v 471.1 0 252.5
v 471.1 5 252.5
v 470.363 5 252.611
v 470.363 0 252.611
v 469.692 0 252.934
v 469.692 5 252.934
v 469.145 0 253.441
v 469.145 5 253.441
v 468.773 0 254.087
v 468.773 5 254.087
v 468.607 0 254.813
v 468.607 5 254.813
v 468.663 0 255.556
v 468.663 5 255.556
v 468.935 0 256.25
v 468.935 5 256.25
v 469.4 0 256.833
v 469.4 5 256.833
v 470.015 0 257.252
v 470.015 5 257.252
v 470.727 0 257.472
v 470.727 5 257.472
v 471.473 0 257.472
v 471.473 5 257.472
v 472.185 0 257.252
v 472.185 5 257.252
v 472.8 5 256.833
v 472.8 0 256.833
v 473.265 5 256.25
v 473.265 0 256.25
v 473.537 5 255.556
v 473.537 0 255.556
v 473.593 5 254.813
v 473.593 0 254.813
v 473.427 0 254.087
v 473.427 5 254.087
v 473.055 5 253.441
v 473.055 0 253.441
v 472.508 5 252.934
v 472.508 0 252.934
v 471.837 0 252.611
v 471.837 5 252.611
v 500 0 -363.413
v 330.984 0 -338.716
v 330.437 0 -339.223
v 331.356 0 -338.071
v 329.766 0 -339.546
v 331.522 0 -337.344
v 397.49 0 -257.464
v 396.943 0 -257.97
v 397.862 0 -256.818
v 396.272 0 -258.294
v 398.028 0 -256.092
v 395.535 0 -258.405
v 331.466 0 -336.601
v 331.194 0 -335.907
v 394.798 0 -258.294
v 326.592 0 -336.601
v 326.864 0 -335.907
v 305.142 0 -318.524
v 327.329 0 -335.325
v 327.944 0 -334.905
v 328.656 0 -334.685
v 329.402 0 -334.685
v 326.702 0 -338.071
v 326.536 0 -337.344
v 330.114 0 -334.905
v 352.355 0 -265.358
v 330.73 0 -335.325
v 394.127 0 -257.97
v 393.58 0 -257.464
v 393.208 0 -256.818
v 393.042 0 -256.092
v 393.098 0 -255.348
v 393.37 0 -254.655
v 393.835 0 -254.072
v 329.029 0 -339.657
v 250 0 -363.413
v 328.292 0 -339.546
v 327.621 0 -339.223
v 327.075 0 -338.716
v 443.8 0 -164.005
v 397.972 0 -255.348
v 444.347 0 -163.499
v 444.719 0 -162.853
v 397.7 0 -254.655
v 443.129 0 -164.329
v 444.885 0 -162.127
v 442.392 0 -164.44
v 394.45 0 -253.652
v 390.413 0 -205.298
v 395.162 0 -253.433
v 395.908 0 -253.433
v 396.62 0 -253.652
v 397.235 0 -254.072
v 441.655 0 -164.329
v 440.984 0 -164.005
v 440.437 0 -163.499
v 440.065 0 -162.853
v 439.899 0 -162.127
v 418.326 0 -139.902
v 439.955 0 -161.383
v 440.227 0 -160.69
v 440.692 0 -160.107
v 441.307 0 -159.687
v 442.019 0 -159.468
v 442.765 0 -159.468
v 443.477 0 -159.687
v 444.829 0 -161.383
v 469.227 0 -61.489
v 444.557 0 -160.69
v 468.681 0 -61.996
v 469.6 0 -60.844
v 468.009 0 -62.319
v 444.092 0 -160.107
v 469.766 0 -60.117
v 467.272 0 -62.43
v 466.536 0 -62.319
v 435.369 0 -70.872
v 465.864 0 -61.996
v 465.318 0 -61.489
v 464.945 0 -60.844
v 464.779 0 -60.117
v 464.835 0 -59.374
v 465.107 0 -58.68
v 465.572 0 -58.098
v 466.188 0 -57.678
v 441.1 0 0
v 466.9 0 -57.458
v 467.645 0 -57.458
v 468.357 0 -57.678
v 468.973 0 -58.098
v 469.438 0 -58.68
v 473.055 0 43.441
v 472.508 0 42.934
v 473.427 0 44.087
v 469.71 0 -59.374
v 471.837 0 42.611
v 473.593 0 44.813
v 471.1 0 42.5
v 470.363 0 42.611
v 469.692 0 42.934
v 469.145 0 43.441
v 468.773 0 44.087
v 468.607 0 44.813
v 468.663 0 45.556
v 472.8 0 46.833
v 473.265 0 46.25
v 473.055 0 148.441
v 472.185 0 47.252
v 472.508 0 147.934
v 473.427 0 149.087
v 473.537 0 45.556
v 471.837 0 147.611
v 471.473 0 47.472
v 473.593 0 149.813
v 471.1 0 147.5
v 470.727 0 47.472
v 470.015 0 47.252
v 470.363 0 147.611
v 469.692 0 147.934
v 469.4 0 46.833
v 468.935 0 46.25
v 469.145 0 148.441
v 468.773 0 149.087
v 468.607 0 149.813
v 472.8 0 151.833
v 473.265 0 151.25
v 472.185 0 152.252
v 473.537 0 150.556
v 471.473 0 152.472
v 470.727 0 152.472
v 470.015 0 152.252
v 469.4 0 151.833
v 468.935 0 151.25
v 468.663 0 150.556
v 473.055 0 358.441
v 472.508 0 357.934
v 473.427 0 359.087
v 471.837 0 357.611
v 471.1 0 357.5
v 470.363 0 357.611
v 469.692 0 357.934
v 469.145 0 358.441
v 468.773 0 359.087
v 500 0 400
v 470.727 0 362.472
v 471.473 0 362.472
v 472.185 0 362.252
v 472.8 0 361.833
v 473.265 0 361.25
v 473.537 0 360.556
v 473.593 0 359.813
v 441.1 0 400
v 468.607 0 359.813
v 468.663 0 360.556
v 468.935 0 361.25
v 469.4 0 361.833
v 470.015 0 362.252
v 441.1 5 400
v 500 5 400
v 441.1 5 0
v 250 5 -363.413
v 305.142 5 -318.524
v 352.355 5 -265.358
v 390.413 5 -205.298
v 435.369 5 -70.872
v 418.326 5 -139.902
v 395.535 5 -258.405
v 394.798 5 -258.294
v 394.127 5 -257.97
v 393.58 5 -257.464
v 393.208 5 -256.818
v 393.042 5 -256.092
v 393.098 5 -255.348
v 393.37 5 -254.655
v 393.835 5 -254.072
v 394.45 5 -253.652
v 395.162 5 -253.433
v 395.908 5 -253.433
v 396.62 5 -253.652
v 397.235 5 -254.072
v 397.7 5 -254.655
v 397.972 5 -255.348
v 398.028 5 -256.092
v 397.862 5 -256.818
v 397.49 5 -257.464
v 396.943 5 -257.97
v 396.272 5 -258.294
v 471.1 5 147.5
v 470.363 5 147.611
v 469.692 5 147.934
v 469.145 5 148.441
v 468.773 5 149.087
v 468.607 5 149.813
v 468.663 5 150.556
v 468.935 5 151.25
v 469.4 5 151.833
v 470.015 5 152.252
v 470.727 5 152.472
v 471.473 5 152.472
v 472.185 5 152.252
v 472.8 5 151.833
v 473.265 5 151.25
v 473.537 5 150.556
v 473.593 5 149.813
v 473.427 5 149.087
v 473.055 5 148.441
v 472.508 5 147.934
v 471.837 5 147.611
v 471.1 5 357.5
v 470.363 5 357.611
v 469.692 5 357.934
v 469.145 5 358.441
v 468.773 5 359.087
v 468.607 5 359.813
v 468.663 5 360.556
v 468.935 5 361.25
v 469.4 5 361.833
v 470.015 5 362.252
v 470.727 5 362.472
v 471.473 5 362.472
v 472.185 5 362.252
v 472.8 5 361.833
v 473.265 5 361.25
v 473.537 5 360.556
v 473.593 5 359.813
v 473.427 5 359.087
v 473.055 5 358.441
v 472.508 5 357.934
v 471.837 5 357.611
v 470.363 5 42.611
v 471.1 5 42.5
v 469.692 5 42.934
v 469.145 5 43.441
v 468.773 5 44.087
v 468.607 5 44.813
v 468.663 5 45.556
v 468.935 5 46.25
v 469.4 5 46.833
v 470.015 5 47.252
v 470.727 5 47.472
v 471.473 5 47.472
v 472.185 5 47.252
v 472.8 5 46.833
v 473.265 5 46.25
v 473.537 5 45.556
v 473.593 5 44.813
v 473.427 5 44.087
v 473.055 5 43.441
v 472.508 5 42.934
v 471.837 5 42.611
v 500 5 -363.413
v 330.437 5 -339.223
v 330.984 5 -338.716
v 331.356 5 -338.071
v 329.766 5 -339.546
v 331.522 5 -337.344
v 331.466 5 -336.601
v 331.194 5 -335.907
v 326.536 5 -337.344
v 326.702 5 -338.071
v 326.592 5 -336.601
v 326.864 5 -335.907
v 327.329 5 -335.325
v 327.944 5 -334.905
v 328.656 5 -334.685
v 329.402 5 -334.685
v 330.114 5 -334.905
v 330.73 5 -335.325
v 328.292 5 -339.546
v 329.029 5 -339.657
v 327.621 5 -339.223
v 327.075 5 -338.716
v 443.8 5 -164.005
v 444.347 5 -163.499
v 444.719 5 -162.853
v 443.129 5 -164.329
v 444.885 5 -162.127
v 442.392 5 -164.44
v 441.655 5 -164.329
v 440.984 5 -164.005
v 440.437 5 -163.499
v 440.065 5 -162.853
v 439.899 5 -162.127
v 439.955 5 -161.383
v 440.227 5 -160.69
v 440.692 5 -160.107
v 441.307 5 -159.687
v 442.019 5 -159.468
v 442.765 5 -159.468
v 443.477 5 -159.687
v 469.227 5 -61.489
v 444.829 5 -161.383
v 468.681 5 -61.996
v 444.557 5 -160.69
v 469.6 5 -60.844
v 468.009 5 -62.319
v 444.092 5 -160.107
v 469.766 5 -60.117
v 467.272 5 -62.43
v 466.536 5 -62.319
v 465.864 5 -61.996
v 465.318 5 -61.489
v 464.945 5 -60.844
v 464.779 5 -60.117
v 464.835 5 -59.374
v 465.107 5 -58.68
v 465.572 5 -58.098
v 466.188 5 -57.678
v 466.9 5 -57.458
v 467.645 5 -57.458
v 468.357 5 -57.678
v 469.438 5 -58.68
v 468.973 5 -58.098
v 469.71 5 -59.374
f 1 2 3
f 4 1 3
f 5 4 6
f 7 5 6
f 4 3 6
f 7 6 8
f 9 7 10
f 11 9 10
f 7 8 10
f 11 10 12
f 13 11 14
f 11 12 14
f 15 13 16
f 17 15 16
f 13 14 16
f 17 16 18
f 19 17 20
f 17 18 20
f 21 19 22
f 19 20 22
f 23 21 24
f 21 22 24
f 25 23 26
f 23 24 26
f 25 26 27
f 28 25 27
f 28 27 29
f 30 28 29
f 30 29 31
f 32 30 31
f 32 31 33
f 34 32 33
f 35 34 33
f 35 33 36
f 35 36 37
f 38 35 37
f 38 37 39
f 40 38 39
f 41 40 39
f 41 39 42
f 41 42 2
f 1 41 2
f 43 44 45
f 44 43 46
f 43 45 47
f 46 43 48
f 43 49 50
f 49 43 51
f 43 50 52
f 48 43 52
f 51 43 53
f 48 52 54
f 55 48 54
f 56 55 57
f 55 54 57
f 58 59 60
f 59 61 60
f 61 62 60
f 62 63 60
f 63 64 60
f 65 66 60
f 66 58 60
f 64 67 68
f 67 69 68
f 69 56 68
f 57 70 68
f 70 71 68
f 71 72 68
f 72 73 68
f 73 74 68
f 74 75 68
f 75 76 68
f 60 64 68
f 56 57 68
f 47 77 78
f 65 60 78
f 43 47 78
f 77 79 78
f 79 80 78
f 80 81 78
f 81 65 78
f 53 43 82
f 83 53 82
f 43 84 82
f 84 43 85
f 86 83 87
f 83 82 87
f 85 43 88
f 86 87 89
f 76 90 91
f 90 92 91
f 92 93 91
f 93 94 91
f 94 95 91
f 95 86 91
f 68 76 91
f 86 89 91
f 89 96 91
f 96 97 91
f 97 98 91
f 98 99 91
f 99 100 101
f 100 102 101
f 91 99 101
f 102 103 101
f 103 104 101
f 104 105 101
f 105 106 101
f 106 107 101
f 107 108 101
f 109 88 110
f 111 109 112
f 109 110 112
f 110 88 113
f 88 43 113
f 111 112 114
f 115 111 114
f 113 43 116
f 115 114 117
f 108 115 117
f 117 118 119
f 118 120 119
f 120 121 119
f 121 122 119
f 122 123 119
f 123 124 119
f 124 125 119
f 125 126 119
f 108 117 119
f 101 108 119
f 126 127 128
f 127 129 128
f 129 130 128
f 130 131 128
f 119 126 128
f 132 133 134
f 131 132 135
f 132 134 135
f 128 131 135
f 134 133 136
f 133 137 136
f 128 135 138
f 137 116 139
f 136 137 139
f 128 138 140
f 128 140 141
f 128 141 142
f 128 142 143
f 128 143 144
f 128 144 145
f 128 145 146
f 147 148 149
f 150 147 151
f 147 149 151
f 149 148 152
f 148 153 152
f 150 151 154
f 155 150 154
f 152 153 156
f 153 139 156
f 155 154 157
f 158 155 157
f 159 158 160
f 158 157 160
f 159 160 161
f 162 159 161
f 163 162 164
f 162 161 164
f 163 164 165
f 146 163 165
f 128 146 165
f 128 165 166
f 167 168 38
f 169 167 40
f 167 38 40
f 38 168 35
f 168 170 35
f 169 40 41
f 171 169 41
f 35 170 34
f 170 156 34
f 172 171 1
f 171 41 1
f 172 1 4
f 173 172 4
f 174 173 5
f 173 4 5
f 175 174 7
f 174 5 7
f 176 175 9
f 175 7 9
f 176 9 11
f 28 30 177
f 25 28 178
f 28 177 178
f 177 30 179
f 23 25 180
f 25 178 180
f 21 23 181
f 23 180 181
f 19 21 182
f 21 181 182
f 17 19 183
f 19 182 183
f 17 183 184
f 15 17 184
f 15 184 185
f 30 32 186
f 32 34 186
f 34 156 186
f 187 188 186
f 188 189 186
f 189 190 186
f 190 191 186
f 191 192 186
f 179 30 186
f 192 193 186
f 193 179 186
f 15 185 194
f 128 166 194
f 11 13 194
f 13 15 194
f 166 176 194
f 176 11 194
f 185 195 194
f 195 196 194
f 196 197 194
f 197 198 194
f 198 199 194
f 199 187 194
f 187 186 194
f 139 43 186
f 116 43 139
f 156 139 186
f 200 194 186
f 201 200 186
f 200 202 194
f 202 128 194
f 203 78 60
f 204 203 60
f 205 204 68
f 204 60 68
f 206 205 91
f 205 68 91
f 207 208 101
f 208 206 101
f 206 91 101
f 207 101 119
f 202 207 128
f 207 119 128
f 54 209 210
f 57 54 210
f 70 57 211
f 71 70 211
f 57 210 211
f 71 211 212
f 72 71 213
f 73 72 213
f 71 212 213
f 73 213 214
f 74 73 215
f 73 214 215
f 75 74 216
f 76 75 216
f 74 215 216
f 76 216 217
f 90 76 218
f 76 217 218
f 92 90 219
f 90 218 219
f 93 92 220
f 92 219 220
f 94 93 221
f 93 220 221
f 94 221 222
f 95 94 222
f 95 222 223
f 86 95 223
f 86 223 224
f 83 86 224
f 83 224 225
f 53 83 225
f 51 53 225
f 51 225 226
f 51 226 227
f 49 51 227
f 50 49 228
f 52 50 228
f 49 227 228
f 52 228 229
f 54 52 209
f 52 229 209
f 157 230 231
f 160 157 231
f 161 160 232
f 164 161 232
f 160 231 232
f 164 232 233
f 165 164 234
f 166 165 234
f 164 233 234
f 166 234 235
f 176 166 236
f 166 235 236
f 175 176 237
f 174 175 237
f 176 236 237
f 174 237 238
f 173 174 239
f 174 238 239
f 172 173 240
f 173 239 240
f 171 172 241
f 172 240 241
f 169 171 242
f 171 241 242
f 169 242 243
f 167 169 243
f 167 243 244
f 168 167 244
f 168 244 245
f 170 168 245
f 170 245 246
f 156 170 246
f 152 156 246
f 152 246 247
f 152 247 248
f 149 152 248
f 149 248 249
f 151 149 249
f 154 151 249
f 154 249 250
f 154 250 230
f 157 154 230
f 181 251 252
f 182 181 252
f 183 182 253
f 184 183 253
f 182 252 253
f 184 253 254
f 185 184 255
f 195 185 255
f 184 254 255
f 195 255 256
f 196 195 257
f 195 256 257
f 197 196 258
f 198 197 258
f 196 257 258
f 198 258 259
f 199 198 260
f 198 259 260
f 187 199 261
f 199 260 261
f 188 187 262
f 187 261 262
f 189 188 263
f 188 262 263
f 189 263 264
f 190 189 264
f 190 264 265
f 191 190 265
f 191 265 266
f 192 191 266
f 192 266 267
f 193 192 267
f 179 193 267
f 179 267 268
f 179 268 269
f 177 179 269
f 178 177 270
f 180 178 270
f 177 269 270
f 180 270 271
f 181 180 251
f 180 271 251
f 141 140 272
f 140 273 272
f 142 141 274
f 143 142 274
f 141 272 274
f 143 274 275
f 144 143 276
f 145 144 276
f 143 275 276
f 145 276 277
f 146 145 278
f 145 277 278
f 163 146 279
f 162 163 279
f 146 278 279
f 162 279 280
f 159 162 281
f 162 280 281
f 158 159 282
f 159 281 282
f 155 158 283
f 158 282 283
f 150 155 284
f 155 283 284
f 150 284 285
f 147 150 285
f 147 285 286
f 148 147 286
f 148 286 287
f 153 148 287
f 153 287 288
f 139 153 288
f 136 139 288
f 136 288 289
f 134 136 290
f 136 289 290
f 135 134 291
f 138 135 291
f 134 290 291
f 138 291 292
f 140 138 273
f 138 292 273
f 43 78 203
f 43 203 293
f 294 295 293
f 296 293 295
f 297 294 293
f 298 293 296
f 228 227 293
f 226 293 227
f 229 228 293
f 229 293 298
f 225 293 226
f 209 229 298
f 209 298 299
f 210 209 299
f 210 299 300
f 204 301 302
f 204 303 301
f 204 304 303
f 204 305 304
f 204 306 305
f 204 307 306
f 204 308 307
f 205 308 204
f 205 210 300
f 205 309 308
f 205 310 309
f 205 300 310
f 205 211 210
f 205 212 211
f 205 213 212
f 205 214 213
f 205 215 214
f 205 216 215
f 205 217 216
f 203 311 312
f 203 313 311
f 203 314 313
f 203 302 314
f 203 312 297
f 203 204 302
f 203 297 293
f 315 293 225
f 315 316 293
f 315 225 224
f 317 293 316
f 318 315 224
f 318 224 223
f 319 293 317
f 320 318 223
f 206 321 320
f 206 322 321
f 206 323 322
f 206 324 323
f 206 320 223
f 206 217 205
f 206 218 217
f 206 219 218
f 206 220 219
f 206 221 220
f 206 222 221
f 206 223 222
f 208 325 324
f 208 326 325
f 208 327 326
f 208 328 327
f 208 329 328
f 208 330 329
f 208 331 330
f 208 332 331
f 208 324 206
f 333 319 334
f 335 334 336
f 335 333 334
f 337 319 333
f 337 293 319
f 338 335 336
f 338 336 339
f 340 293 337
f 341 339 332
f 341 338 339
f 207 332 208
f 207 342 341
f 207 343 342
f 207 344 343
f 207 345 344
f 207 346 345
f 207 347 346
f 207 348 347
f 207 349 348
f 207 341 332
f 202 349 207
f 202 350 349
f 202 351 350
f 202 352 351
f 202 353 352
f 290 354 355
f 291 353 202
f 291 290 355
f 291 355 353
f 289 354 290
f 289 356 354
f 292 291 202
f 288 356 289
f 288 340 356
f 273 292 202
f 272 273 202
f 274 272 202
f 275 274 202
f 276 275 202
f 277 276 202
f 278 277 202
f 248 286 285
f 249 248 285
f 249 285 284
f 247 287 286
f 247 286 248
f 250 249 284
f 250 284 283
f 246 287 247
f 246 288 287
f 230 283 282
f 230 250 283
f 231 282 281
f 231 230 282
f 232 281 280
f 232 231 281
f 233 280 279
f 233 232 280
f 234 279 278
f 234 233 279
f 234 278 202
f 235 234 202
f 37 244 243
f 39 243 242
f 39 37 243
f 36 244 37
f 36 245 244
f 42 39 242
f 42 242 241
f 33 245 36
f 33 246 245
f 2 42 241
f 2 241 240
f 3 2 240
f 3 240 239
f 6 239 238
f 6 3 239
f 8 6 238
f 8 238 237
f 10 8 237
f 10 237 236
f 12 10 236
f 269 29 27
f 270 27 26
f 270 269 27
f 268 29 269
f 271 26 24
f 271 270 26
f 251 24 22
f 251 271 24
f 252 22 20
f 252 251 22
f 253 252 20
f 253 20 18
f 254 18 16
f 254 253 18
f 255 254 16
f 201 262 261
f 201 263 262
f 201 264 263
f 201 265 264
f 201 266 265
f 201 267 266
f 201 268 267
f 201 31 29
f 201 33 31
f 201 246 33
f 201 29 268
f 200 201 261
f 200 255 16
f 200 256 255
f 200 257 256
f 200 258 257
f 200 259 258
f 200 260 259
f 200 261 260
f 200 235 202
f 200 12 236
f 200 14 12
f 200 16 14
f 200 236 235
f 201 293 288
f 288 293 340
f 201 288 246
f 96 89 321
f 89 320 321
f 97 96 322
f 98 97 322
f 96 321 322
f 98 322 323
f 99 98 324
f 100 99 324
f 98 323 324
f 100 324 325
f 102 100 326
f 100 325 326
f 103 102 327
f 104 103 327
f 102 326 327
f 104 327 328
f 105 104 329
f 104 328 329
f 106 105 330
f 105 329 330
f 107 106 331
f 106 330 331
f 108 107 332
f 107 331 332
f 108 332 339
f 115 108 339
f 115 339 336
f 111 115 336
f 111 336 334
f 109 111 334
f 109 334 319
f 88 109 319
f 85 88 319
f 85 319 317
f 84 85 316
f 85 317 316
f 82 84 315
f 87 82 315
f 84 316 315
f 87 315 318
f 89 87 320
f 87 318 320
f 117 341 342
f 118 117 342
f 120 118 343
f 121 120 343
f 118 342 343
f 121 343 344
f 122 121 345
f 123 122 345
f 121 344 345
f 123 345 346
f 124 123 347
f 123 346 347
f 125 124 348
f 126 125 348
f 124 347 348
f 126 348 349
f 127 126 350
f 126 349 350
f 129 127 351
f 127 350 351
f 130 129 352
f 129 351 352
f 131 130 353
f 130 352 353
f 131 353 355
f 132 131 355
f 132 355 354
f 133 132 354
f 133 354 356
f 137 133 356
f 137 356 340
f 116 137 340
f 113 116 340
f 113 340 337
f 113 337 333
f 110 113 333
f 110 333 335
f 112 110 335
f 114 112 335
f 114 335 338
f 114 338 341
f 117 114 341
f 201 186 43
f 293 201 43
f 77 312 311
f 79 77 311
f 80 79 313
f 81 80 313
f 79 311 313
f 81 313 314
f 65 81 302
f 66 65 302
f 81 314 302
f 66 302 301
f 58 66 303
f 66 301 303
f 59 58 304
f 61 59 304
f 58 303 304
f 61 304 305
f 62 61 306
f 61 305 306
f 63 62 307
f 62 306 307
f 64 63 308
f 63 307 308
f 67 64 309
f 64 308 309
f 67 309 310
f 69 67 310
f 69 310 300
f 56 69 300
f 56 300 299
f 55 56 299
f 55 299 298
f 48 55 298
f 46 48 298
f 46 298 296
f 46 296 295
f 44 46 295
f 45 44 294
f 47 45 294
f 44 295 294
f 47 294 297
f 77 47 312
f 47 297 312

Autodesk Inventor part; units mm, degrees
ref_plane "YZ Plane" through (0, 0, 0) normal (1, 0, 0) x (0, 1, 0)
ref_plane "XZ Plane" through (0, 0, 0) normal (0, 1, 0) x (-1, 0, 0)
ref_plane "XY Plane" through (0, 0, 0) normal (0, 0, 1) x (1, 0, 0)
sketch "Sketch1" plane through (0, 0, 0) normal (0, 1, 0) x (-1, 0, 0)
  line L0 (0, 290.198) -> (0, -290.198) construction
  line L1 (98.4779, 0) -> (-98.4779, 0) construction
  arc A0 (-441.1, 0) -> (-250, -363.4133) centre (0, 0) ccw
  line L2 (-441.1, 0) -> (-441.1, 400)
  line L3 (-441.1, 400) -> (-500, 400)
  line L4 (-500, 400) -> (-500, -363.4133)
  line L5 (-250, -363.4133) -> (-500, -363.4133)
  dimension "d0" = 500
  dimension "d1" = 400
  dimension "d3" = 441.1
  dimension "d5" = 363.4133
extrude "Extrusion1" add sketch "Sketch1" along normal blind 5
sketch "Sketch2" plane through (0, 0, 0) normal (0, -1, 0) x (1, 0, 0)
  line L0 (441.1, 400) -> (500, 400) projected
  line L1 (441.1, 0) -> (441.1, 400) projected
  line L2 (0, 0) -> (467.2725, -59.9302) construction
  line L3 (0, 0) -> (442.392, -161.9398) construction
  line L4 (0, 0) -> (395.535, -255.9048) construction
  line L5 (0, 0) -> (329.0291, -337.1573) construction
  line L6 (471.1, 255) -> (471.1, 360) construction
  line L7 (471.1, 255) -> (471.1, 150) construction
  line L8 (471.1, 150) -> (471.1, 45) construction
  line L9 (500, 400) -> (500, -363.4133) construction
  line L10 (471.1, 45) -> (467.2725, -59.9302) construction
  line L11 (467.2725, -59.9302) -> (442.392, -161.9398) construction
  line L12 (442.392, -161.9398) -> (395.535, -255.9048) construction
  line L13 (395.535, -255.9048) -> (329.0291, -337.1573) construction
  point P0 (470.55, 400)
  dimension "d8" = 40
  dimension "d9" = 30
  dimension "d10" = 471.1
  dimension "d15" = 105
hole "Hole1" at (471.1, 0, 360) at (471.1, 0, 255) at (471.1, 0, 150) at (471.1, 0, 45) at (467.2725, 0, -59.9302) at (442.392, 0, -161.9398) at (395.535, 0, -255.9048) at (329.0291, 0, -337.1573) direction (0, 1, 0) diameter 5 end through all
properties part number "boundaryHalf1V1"
